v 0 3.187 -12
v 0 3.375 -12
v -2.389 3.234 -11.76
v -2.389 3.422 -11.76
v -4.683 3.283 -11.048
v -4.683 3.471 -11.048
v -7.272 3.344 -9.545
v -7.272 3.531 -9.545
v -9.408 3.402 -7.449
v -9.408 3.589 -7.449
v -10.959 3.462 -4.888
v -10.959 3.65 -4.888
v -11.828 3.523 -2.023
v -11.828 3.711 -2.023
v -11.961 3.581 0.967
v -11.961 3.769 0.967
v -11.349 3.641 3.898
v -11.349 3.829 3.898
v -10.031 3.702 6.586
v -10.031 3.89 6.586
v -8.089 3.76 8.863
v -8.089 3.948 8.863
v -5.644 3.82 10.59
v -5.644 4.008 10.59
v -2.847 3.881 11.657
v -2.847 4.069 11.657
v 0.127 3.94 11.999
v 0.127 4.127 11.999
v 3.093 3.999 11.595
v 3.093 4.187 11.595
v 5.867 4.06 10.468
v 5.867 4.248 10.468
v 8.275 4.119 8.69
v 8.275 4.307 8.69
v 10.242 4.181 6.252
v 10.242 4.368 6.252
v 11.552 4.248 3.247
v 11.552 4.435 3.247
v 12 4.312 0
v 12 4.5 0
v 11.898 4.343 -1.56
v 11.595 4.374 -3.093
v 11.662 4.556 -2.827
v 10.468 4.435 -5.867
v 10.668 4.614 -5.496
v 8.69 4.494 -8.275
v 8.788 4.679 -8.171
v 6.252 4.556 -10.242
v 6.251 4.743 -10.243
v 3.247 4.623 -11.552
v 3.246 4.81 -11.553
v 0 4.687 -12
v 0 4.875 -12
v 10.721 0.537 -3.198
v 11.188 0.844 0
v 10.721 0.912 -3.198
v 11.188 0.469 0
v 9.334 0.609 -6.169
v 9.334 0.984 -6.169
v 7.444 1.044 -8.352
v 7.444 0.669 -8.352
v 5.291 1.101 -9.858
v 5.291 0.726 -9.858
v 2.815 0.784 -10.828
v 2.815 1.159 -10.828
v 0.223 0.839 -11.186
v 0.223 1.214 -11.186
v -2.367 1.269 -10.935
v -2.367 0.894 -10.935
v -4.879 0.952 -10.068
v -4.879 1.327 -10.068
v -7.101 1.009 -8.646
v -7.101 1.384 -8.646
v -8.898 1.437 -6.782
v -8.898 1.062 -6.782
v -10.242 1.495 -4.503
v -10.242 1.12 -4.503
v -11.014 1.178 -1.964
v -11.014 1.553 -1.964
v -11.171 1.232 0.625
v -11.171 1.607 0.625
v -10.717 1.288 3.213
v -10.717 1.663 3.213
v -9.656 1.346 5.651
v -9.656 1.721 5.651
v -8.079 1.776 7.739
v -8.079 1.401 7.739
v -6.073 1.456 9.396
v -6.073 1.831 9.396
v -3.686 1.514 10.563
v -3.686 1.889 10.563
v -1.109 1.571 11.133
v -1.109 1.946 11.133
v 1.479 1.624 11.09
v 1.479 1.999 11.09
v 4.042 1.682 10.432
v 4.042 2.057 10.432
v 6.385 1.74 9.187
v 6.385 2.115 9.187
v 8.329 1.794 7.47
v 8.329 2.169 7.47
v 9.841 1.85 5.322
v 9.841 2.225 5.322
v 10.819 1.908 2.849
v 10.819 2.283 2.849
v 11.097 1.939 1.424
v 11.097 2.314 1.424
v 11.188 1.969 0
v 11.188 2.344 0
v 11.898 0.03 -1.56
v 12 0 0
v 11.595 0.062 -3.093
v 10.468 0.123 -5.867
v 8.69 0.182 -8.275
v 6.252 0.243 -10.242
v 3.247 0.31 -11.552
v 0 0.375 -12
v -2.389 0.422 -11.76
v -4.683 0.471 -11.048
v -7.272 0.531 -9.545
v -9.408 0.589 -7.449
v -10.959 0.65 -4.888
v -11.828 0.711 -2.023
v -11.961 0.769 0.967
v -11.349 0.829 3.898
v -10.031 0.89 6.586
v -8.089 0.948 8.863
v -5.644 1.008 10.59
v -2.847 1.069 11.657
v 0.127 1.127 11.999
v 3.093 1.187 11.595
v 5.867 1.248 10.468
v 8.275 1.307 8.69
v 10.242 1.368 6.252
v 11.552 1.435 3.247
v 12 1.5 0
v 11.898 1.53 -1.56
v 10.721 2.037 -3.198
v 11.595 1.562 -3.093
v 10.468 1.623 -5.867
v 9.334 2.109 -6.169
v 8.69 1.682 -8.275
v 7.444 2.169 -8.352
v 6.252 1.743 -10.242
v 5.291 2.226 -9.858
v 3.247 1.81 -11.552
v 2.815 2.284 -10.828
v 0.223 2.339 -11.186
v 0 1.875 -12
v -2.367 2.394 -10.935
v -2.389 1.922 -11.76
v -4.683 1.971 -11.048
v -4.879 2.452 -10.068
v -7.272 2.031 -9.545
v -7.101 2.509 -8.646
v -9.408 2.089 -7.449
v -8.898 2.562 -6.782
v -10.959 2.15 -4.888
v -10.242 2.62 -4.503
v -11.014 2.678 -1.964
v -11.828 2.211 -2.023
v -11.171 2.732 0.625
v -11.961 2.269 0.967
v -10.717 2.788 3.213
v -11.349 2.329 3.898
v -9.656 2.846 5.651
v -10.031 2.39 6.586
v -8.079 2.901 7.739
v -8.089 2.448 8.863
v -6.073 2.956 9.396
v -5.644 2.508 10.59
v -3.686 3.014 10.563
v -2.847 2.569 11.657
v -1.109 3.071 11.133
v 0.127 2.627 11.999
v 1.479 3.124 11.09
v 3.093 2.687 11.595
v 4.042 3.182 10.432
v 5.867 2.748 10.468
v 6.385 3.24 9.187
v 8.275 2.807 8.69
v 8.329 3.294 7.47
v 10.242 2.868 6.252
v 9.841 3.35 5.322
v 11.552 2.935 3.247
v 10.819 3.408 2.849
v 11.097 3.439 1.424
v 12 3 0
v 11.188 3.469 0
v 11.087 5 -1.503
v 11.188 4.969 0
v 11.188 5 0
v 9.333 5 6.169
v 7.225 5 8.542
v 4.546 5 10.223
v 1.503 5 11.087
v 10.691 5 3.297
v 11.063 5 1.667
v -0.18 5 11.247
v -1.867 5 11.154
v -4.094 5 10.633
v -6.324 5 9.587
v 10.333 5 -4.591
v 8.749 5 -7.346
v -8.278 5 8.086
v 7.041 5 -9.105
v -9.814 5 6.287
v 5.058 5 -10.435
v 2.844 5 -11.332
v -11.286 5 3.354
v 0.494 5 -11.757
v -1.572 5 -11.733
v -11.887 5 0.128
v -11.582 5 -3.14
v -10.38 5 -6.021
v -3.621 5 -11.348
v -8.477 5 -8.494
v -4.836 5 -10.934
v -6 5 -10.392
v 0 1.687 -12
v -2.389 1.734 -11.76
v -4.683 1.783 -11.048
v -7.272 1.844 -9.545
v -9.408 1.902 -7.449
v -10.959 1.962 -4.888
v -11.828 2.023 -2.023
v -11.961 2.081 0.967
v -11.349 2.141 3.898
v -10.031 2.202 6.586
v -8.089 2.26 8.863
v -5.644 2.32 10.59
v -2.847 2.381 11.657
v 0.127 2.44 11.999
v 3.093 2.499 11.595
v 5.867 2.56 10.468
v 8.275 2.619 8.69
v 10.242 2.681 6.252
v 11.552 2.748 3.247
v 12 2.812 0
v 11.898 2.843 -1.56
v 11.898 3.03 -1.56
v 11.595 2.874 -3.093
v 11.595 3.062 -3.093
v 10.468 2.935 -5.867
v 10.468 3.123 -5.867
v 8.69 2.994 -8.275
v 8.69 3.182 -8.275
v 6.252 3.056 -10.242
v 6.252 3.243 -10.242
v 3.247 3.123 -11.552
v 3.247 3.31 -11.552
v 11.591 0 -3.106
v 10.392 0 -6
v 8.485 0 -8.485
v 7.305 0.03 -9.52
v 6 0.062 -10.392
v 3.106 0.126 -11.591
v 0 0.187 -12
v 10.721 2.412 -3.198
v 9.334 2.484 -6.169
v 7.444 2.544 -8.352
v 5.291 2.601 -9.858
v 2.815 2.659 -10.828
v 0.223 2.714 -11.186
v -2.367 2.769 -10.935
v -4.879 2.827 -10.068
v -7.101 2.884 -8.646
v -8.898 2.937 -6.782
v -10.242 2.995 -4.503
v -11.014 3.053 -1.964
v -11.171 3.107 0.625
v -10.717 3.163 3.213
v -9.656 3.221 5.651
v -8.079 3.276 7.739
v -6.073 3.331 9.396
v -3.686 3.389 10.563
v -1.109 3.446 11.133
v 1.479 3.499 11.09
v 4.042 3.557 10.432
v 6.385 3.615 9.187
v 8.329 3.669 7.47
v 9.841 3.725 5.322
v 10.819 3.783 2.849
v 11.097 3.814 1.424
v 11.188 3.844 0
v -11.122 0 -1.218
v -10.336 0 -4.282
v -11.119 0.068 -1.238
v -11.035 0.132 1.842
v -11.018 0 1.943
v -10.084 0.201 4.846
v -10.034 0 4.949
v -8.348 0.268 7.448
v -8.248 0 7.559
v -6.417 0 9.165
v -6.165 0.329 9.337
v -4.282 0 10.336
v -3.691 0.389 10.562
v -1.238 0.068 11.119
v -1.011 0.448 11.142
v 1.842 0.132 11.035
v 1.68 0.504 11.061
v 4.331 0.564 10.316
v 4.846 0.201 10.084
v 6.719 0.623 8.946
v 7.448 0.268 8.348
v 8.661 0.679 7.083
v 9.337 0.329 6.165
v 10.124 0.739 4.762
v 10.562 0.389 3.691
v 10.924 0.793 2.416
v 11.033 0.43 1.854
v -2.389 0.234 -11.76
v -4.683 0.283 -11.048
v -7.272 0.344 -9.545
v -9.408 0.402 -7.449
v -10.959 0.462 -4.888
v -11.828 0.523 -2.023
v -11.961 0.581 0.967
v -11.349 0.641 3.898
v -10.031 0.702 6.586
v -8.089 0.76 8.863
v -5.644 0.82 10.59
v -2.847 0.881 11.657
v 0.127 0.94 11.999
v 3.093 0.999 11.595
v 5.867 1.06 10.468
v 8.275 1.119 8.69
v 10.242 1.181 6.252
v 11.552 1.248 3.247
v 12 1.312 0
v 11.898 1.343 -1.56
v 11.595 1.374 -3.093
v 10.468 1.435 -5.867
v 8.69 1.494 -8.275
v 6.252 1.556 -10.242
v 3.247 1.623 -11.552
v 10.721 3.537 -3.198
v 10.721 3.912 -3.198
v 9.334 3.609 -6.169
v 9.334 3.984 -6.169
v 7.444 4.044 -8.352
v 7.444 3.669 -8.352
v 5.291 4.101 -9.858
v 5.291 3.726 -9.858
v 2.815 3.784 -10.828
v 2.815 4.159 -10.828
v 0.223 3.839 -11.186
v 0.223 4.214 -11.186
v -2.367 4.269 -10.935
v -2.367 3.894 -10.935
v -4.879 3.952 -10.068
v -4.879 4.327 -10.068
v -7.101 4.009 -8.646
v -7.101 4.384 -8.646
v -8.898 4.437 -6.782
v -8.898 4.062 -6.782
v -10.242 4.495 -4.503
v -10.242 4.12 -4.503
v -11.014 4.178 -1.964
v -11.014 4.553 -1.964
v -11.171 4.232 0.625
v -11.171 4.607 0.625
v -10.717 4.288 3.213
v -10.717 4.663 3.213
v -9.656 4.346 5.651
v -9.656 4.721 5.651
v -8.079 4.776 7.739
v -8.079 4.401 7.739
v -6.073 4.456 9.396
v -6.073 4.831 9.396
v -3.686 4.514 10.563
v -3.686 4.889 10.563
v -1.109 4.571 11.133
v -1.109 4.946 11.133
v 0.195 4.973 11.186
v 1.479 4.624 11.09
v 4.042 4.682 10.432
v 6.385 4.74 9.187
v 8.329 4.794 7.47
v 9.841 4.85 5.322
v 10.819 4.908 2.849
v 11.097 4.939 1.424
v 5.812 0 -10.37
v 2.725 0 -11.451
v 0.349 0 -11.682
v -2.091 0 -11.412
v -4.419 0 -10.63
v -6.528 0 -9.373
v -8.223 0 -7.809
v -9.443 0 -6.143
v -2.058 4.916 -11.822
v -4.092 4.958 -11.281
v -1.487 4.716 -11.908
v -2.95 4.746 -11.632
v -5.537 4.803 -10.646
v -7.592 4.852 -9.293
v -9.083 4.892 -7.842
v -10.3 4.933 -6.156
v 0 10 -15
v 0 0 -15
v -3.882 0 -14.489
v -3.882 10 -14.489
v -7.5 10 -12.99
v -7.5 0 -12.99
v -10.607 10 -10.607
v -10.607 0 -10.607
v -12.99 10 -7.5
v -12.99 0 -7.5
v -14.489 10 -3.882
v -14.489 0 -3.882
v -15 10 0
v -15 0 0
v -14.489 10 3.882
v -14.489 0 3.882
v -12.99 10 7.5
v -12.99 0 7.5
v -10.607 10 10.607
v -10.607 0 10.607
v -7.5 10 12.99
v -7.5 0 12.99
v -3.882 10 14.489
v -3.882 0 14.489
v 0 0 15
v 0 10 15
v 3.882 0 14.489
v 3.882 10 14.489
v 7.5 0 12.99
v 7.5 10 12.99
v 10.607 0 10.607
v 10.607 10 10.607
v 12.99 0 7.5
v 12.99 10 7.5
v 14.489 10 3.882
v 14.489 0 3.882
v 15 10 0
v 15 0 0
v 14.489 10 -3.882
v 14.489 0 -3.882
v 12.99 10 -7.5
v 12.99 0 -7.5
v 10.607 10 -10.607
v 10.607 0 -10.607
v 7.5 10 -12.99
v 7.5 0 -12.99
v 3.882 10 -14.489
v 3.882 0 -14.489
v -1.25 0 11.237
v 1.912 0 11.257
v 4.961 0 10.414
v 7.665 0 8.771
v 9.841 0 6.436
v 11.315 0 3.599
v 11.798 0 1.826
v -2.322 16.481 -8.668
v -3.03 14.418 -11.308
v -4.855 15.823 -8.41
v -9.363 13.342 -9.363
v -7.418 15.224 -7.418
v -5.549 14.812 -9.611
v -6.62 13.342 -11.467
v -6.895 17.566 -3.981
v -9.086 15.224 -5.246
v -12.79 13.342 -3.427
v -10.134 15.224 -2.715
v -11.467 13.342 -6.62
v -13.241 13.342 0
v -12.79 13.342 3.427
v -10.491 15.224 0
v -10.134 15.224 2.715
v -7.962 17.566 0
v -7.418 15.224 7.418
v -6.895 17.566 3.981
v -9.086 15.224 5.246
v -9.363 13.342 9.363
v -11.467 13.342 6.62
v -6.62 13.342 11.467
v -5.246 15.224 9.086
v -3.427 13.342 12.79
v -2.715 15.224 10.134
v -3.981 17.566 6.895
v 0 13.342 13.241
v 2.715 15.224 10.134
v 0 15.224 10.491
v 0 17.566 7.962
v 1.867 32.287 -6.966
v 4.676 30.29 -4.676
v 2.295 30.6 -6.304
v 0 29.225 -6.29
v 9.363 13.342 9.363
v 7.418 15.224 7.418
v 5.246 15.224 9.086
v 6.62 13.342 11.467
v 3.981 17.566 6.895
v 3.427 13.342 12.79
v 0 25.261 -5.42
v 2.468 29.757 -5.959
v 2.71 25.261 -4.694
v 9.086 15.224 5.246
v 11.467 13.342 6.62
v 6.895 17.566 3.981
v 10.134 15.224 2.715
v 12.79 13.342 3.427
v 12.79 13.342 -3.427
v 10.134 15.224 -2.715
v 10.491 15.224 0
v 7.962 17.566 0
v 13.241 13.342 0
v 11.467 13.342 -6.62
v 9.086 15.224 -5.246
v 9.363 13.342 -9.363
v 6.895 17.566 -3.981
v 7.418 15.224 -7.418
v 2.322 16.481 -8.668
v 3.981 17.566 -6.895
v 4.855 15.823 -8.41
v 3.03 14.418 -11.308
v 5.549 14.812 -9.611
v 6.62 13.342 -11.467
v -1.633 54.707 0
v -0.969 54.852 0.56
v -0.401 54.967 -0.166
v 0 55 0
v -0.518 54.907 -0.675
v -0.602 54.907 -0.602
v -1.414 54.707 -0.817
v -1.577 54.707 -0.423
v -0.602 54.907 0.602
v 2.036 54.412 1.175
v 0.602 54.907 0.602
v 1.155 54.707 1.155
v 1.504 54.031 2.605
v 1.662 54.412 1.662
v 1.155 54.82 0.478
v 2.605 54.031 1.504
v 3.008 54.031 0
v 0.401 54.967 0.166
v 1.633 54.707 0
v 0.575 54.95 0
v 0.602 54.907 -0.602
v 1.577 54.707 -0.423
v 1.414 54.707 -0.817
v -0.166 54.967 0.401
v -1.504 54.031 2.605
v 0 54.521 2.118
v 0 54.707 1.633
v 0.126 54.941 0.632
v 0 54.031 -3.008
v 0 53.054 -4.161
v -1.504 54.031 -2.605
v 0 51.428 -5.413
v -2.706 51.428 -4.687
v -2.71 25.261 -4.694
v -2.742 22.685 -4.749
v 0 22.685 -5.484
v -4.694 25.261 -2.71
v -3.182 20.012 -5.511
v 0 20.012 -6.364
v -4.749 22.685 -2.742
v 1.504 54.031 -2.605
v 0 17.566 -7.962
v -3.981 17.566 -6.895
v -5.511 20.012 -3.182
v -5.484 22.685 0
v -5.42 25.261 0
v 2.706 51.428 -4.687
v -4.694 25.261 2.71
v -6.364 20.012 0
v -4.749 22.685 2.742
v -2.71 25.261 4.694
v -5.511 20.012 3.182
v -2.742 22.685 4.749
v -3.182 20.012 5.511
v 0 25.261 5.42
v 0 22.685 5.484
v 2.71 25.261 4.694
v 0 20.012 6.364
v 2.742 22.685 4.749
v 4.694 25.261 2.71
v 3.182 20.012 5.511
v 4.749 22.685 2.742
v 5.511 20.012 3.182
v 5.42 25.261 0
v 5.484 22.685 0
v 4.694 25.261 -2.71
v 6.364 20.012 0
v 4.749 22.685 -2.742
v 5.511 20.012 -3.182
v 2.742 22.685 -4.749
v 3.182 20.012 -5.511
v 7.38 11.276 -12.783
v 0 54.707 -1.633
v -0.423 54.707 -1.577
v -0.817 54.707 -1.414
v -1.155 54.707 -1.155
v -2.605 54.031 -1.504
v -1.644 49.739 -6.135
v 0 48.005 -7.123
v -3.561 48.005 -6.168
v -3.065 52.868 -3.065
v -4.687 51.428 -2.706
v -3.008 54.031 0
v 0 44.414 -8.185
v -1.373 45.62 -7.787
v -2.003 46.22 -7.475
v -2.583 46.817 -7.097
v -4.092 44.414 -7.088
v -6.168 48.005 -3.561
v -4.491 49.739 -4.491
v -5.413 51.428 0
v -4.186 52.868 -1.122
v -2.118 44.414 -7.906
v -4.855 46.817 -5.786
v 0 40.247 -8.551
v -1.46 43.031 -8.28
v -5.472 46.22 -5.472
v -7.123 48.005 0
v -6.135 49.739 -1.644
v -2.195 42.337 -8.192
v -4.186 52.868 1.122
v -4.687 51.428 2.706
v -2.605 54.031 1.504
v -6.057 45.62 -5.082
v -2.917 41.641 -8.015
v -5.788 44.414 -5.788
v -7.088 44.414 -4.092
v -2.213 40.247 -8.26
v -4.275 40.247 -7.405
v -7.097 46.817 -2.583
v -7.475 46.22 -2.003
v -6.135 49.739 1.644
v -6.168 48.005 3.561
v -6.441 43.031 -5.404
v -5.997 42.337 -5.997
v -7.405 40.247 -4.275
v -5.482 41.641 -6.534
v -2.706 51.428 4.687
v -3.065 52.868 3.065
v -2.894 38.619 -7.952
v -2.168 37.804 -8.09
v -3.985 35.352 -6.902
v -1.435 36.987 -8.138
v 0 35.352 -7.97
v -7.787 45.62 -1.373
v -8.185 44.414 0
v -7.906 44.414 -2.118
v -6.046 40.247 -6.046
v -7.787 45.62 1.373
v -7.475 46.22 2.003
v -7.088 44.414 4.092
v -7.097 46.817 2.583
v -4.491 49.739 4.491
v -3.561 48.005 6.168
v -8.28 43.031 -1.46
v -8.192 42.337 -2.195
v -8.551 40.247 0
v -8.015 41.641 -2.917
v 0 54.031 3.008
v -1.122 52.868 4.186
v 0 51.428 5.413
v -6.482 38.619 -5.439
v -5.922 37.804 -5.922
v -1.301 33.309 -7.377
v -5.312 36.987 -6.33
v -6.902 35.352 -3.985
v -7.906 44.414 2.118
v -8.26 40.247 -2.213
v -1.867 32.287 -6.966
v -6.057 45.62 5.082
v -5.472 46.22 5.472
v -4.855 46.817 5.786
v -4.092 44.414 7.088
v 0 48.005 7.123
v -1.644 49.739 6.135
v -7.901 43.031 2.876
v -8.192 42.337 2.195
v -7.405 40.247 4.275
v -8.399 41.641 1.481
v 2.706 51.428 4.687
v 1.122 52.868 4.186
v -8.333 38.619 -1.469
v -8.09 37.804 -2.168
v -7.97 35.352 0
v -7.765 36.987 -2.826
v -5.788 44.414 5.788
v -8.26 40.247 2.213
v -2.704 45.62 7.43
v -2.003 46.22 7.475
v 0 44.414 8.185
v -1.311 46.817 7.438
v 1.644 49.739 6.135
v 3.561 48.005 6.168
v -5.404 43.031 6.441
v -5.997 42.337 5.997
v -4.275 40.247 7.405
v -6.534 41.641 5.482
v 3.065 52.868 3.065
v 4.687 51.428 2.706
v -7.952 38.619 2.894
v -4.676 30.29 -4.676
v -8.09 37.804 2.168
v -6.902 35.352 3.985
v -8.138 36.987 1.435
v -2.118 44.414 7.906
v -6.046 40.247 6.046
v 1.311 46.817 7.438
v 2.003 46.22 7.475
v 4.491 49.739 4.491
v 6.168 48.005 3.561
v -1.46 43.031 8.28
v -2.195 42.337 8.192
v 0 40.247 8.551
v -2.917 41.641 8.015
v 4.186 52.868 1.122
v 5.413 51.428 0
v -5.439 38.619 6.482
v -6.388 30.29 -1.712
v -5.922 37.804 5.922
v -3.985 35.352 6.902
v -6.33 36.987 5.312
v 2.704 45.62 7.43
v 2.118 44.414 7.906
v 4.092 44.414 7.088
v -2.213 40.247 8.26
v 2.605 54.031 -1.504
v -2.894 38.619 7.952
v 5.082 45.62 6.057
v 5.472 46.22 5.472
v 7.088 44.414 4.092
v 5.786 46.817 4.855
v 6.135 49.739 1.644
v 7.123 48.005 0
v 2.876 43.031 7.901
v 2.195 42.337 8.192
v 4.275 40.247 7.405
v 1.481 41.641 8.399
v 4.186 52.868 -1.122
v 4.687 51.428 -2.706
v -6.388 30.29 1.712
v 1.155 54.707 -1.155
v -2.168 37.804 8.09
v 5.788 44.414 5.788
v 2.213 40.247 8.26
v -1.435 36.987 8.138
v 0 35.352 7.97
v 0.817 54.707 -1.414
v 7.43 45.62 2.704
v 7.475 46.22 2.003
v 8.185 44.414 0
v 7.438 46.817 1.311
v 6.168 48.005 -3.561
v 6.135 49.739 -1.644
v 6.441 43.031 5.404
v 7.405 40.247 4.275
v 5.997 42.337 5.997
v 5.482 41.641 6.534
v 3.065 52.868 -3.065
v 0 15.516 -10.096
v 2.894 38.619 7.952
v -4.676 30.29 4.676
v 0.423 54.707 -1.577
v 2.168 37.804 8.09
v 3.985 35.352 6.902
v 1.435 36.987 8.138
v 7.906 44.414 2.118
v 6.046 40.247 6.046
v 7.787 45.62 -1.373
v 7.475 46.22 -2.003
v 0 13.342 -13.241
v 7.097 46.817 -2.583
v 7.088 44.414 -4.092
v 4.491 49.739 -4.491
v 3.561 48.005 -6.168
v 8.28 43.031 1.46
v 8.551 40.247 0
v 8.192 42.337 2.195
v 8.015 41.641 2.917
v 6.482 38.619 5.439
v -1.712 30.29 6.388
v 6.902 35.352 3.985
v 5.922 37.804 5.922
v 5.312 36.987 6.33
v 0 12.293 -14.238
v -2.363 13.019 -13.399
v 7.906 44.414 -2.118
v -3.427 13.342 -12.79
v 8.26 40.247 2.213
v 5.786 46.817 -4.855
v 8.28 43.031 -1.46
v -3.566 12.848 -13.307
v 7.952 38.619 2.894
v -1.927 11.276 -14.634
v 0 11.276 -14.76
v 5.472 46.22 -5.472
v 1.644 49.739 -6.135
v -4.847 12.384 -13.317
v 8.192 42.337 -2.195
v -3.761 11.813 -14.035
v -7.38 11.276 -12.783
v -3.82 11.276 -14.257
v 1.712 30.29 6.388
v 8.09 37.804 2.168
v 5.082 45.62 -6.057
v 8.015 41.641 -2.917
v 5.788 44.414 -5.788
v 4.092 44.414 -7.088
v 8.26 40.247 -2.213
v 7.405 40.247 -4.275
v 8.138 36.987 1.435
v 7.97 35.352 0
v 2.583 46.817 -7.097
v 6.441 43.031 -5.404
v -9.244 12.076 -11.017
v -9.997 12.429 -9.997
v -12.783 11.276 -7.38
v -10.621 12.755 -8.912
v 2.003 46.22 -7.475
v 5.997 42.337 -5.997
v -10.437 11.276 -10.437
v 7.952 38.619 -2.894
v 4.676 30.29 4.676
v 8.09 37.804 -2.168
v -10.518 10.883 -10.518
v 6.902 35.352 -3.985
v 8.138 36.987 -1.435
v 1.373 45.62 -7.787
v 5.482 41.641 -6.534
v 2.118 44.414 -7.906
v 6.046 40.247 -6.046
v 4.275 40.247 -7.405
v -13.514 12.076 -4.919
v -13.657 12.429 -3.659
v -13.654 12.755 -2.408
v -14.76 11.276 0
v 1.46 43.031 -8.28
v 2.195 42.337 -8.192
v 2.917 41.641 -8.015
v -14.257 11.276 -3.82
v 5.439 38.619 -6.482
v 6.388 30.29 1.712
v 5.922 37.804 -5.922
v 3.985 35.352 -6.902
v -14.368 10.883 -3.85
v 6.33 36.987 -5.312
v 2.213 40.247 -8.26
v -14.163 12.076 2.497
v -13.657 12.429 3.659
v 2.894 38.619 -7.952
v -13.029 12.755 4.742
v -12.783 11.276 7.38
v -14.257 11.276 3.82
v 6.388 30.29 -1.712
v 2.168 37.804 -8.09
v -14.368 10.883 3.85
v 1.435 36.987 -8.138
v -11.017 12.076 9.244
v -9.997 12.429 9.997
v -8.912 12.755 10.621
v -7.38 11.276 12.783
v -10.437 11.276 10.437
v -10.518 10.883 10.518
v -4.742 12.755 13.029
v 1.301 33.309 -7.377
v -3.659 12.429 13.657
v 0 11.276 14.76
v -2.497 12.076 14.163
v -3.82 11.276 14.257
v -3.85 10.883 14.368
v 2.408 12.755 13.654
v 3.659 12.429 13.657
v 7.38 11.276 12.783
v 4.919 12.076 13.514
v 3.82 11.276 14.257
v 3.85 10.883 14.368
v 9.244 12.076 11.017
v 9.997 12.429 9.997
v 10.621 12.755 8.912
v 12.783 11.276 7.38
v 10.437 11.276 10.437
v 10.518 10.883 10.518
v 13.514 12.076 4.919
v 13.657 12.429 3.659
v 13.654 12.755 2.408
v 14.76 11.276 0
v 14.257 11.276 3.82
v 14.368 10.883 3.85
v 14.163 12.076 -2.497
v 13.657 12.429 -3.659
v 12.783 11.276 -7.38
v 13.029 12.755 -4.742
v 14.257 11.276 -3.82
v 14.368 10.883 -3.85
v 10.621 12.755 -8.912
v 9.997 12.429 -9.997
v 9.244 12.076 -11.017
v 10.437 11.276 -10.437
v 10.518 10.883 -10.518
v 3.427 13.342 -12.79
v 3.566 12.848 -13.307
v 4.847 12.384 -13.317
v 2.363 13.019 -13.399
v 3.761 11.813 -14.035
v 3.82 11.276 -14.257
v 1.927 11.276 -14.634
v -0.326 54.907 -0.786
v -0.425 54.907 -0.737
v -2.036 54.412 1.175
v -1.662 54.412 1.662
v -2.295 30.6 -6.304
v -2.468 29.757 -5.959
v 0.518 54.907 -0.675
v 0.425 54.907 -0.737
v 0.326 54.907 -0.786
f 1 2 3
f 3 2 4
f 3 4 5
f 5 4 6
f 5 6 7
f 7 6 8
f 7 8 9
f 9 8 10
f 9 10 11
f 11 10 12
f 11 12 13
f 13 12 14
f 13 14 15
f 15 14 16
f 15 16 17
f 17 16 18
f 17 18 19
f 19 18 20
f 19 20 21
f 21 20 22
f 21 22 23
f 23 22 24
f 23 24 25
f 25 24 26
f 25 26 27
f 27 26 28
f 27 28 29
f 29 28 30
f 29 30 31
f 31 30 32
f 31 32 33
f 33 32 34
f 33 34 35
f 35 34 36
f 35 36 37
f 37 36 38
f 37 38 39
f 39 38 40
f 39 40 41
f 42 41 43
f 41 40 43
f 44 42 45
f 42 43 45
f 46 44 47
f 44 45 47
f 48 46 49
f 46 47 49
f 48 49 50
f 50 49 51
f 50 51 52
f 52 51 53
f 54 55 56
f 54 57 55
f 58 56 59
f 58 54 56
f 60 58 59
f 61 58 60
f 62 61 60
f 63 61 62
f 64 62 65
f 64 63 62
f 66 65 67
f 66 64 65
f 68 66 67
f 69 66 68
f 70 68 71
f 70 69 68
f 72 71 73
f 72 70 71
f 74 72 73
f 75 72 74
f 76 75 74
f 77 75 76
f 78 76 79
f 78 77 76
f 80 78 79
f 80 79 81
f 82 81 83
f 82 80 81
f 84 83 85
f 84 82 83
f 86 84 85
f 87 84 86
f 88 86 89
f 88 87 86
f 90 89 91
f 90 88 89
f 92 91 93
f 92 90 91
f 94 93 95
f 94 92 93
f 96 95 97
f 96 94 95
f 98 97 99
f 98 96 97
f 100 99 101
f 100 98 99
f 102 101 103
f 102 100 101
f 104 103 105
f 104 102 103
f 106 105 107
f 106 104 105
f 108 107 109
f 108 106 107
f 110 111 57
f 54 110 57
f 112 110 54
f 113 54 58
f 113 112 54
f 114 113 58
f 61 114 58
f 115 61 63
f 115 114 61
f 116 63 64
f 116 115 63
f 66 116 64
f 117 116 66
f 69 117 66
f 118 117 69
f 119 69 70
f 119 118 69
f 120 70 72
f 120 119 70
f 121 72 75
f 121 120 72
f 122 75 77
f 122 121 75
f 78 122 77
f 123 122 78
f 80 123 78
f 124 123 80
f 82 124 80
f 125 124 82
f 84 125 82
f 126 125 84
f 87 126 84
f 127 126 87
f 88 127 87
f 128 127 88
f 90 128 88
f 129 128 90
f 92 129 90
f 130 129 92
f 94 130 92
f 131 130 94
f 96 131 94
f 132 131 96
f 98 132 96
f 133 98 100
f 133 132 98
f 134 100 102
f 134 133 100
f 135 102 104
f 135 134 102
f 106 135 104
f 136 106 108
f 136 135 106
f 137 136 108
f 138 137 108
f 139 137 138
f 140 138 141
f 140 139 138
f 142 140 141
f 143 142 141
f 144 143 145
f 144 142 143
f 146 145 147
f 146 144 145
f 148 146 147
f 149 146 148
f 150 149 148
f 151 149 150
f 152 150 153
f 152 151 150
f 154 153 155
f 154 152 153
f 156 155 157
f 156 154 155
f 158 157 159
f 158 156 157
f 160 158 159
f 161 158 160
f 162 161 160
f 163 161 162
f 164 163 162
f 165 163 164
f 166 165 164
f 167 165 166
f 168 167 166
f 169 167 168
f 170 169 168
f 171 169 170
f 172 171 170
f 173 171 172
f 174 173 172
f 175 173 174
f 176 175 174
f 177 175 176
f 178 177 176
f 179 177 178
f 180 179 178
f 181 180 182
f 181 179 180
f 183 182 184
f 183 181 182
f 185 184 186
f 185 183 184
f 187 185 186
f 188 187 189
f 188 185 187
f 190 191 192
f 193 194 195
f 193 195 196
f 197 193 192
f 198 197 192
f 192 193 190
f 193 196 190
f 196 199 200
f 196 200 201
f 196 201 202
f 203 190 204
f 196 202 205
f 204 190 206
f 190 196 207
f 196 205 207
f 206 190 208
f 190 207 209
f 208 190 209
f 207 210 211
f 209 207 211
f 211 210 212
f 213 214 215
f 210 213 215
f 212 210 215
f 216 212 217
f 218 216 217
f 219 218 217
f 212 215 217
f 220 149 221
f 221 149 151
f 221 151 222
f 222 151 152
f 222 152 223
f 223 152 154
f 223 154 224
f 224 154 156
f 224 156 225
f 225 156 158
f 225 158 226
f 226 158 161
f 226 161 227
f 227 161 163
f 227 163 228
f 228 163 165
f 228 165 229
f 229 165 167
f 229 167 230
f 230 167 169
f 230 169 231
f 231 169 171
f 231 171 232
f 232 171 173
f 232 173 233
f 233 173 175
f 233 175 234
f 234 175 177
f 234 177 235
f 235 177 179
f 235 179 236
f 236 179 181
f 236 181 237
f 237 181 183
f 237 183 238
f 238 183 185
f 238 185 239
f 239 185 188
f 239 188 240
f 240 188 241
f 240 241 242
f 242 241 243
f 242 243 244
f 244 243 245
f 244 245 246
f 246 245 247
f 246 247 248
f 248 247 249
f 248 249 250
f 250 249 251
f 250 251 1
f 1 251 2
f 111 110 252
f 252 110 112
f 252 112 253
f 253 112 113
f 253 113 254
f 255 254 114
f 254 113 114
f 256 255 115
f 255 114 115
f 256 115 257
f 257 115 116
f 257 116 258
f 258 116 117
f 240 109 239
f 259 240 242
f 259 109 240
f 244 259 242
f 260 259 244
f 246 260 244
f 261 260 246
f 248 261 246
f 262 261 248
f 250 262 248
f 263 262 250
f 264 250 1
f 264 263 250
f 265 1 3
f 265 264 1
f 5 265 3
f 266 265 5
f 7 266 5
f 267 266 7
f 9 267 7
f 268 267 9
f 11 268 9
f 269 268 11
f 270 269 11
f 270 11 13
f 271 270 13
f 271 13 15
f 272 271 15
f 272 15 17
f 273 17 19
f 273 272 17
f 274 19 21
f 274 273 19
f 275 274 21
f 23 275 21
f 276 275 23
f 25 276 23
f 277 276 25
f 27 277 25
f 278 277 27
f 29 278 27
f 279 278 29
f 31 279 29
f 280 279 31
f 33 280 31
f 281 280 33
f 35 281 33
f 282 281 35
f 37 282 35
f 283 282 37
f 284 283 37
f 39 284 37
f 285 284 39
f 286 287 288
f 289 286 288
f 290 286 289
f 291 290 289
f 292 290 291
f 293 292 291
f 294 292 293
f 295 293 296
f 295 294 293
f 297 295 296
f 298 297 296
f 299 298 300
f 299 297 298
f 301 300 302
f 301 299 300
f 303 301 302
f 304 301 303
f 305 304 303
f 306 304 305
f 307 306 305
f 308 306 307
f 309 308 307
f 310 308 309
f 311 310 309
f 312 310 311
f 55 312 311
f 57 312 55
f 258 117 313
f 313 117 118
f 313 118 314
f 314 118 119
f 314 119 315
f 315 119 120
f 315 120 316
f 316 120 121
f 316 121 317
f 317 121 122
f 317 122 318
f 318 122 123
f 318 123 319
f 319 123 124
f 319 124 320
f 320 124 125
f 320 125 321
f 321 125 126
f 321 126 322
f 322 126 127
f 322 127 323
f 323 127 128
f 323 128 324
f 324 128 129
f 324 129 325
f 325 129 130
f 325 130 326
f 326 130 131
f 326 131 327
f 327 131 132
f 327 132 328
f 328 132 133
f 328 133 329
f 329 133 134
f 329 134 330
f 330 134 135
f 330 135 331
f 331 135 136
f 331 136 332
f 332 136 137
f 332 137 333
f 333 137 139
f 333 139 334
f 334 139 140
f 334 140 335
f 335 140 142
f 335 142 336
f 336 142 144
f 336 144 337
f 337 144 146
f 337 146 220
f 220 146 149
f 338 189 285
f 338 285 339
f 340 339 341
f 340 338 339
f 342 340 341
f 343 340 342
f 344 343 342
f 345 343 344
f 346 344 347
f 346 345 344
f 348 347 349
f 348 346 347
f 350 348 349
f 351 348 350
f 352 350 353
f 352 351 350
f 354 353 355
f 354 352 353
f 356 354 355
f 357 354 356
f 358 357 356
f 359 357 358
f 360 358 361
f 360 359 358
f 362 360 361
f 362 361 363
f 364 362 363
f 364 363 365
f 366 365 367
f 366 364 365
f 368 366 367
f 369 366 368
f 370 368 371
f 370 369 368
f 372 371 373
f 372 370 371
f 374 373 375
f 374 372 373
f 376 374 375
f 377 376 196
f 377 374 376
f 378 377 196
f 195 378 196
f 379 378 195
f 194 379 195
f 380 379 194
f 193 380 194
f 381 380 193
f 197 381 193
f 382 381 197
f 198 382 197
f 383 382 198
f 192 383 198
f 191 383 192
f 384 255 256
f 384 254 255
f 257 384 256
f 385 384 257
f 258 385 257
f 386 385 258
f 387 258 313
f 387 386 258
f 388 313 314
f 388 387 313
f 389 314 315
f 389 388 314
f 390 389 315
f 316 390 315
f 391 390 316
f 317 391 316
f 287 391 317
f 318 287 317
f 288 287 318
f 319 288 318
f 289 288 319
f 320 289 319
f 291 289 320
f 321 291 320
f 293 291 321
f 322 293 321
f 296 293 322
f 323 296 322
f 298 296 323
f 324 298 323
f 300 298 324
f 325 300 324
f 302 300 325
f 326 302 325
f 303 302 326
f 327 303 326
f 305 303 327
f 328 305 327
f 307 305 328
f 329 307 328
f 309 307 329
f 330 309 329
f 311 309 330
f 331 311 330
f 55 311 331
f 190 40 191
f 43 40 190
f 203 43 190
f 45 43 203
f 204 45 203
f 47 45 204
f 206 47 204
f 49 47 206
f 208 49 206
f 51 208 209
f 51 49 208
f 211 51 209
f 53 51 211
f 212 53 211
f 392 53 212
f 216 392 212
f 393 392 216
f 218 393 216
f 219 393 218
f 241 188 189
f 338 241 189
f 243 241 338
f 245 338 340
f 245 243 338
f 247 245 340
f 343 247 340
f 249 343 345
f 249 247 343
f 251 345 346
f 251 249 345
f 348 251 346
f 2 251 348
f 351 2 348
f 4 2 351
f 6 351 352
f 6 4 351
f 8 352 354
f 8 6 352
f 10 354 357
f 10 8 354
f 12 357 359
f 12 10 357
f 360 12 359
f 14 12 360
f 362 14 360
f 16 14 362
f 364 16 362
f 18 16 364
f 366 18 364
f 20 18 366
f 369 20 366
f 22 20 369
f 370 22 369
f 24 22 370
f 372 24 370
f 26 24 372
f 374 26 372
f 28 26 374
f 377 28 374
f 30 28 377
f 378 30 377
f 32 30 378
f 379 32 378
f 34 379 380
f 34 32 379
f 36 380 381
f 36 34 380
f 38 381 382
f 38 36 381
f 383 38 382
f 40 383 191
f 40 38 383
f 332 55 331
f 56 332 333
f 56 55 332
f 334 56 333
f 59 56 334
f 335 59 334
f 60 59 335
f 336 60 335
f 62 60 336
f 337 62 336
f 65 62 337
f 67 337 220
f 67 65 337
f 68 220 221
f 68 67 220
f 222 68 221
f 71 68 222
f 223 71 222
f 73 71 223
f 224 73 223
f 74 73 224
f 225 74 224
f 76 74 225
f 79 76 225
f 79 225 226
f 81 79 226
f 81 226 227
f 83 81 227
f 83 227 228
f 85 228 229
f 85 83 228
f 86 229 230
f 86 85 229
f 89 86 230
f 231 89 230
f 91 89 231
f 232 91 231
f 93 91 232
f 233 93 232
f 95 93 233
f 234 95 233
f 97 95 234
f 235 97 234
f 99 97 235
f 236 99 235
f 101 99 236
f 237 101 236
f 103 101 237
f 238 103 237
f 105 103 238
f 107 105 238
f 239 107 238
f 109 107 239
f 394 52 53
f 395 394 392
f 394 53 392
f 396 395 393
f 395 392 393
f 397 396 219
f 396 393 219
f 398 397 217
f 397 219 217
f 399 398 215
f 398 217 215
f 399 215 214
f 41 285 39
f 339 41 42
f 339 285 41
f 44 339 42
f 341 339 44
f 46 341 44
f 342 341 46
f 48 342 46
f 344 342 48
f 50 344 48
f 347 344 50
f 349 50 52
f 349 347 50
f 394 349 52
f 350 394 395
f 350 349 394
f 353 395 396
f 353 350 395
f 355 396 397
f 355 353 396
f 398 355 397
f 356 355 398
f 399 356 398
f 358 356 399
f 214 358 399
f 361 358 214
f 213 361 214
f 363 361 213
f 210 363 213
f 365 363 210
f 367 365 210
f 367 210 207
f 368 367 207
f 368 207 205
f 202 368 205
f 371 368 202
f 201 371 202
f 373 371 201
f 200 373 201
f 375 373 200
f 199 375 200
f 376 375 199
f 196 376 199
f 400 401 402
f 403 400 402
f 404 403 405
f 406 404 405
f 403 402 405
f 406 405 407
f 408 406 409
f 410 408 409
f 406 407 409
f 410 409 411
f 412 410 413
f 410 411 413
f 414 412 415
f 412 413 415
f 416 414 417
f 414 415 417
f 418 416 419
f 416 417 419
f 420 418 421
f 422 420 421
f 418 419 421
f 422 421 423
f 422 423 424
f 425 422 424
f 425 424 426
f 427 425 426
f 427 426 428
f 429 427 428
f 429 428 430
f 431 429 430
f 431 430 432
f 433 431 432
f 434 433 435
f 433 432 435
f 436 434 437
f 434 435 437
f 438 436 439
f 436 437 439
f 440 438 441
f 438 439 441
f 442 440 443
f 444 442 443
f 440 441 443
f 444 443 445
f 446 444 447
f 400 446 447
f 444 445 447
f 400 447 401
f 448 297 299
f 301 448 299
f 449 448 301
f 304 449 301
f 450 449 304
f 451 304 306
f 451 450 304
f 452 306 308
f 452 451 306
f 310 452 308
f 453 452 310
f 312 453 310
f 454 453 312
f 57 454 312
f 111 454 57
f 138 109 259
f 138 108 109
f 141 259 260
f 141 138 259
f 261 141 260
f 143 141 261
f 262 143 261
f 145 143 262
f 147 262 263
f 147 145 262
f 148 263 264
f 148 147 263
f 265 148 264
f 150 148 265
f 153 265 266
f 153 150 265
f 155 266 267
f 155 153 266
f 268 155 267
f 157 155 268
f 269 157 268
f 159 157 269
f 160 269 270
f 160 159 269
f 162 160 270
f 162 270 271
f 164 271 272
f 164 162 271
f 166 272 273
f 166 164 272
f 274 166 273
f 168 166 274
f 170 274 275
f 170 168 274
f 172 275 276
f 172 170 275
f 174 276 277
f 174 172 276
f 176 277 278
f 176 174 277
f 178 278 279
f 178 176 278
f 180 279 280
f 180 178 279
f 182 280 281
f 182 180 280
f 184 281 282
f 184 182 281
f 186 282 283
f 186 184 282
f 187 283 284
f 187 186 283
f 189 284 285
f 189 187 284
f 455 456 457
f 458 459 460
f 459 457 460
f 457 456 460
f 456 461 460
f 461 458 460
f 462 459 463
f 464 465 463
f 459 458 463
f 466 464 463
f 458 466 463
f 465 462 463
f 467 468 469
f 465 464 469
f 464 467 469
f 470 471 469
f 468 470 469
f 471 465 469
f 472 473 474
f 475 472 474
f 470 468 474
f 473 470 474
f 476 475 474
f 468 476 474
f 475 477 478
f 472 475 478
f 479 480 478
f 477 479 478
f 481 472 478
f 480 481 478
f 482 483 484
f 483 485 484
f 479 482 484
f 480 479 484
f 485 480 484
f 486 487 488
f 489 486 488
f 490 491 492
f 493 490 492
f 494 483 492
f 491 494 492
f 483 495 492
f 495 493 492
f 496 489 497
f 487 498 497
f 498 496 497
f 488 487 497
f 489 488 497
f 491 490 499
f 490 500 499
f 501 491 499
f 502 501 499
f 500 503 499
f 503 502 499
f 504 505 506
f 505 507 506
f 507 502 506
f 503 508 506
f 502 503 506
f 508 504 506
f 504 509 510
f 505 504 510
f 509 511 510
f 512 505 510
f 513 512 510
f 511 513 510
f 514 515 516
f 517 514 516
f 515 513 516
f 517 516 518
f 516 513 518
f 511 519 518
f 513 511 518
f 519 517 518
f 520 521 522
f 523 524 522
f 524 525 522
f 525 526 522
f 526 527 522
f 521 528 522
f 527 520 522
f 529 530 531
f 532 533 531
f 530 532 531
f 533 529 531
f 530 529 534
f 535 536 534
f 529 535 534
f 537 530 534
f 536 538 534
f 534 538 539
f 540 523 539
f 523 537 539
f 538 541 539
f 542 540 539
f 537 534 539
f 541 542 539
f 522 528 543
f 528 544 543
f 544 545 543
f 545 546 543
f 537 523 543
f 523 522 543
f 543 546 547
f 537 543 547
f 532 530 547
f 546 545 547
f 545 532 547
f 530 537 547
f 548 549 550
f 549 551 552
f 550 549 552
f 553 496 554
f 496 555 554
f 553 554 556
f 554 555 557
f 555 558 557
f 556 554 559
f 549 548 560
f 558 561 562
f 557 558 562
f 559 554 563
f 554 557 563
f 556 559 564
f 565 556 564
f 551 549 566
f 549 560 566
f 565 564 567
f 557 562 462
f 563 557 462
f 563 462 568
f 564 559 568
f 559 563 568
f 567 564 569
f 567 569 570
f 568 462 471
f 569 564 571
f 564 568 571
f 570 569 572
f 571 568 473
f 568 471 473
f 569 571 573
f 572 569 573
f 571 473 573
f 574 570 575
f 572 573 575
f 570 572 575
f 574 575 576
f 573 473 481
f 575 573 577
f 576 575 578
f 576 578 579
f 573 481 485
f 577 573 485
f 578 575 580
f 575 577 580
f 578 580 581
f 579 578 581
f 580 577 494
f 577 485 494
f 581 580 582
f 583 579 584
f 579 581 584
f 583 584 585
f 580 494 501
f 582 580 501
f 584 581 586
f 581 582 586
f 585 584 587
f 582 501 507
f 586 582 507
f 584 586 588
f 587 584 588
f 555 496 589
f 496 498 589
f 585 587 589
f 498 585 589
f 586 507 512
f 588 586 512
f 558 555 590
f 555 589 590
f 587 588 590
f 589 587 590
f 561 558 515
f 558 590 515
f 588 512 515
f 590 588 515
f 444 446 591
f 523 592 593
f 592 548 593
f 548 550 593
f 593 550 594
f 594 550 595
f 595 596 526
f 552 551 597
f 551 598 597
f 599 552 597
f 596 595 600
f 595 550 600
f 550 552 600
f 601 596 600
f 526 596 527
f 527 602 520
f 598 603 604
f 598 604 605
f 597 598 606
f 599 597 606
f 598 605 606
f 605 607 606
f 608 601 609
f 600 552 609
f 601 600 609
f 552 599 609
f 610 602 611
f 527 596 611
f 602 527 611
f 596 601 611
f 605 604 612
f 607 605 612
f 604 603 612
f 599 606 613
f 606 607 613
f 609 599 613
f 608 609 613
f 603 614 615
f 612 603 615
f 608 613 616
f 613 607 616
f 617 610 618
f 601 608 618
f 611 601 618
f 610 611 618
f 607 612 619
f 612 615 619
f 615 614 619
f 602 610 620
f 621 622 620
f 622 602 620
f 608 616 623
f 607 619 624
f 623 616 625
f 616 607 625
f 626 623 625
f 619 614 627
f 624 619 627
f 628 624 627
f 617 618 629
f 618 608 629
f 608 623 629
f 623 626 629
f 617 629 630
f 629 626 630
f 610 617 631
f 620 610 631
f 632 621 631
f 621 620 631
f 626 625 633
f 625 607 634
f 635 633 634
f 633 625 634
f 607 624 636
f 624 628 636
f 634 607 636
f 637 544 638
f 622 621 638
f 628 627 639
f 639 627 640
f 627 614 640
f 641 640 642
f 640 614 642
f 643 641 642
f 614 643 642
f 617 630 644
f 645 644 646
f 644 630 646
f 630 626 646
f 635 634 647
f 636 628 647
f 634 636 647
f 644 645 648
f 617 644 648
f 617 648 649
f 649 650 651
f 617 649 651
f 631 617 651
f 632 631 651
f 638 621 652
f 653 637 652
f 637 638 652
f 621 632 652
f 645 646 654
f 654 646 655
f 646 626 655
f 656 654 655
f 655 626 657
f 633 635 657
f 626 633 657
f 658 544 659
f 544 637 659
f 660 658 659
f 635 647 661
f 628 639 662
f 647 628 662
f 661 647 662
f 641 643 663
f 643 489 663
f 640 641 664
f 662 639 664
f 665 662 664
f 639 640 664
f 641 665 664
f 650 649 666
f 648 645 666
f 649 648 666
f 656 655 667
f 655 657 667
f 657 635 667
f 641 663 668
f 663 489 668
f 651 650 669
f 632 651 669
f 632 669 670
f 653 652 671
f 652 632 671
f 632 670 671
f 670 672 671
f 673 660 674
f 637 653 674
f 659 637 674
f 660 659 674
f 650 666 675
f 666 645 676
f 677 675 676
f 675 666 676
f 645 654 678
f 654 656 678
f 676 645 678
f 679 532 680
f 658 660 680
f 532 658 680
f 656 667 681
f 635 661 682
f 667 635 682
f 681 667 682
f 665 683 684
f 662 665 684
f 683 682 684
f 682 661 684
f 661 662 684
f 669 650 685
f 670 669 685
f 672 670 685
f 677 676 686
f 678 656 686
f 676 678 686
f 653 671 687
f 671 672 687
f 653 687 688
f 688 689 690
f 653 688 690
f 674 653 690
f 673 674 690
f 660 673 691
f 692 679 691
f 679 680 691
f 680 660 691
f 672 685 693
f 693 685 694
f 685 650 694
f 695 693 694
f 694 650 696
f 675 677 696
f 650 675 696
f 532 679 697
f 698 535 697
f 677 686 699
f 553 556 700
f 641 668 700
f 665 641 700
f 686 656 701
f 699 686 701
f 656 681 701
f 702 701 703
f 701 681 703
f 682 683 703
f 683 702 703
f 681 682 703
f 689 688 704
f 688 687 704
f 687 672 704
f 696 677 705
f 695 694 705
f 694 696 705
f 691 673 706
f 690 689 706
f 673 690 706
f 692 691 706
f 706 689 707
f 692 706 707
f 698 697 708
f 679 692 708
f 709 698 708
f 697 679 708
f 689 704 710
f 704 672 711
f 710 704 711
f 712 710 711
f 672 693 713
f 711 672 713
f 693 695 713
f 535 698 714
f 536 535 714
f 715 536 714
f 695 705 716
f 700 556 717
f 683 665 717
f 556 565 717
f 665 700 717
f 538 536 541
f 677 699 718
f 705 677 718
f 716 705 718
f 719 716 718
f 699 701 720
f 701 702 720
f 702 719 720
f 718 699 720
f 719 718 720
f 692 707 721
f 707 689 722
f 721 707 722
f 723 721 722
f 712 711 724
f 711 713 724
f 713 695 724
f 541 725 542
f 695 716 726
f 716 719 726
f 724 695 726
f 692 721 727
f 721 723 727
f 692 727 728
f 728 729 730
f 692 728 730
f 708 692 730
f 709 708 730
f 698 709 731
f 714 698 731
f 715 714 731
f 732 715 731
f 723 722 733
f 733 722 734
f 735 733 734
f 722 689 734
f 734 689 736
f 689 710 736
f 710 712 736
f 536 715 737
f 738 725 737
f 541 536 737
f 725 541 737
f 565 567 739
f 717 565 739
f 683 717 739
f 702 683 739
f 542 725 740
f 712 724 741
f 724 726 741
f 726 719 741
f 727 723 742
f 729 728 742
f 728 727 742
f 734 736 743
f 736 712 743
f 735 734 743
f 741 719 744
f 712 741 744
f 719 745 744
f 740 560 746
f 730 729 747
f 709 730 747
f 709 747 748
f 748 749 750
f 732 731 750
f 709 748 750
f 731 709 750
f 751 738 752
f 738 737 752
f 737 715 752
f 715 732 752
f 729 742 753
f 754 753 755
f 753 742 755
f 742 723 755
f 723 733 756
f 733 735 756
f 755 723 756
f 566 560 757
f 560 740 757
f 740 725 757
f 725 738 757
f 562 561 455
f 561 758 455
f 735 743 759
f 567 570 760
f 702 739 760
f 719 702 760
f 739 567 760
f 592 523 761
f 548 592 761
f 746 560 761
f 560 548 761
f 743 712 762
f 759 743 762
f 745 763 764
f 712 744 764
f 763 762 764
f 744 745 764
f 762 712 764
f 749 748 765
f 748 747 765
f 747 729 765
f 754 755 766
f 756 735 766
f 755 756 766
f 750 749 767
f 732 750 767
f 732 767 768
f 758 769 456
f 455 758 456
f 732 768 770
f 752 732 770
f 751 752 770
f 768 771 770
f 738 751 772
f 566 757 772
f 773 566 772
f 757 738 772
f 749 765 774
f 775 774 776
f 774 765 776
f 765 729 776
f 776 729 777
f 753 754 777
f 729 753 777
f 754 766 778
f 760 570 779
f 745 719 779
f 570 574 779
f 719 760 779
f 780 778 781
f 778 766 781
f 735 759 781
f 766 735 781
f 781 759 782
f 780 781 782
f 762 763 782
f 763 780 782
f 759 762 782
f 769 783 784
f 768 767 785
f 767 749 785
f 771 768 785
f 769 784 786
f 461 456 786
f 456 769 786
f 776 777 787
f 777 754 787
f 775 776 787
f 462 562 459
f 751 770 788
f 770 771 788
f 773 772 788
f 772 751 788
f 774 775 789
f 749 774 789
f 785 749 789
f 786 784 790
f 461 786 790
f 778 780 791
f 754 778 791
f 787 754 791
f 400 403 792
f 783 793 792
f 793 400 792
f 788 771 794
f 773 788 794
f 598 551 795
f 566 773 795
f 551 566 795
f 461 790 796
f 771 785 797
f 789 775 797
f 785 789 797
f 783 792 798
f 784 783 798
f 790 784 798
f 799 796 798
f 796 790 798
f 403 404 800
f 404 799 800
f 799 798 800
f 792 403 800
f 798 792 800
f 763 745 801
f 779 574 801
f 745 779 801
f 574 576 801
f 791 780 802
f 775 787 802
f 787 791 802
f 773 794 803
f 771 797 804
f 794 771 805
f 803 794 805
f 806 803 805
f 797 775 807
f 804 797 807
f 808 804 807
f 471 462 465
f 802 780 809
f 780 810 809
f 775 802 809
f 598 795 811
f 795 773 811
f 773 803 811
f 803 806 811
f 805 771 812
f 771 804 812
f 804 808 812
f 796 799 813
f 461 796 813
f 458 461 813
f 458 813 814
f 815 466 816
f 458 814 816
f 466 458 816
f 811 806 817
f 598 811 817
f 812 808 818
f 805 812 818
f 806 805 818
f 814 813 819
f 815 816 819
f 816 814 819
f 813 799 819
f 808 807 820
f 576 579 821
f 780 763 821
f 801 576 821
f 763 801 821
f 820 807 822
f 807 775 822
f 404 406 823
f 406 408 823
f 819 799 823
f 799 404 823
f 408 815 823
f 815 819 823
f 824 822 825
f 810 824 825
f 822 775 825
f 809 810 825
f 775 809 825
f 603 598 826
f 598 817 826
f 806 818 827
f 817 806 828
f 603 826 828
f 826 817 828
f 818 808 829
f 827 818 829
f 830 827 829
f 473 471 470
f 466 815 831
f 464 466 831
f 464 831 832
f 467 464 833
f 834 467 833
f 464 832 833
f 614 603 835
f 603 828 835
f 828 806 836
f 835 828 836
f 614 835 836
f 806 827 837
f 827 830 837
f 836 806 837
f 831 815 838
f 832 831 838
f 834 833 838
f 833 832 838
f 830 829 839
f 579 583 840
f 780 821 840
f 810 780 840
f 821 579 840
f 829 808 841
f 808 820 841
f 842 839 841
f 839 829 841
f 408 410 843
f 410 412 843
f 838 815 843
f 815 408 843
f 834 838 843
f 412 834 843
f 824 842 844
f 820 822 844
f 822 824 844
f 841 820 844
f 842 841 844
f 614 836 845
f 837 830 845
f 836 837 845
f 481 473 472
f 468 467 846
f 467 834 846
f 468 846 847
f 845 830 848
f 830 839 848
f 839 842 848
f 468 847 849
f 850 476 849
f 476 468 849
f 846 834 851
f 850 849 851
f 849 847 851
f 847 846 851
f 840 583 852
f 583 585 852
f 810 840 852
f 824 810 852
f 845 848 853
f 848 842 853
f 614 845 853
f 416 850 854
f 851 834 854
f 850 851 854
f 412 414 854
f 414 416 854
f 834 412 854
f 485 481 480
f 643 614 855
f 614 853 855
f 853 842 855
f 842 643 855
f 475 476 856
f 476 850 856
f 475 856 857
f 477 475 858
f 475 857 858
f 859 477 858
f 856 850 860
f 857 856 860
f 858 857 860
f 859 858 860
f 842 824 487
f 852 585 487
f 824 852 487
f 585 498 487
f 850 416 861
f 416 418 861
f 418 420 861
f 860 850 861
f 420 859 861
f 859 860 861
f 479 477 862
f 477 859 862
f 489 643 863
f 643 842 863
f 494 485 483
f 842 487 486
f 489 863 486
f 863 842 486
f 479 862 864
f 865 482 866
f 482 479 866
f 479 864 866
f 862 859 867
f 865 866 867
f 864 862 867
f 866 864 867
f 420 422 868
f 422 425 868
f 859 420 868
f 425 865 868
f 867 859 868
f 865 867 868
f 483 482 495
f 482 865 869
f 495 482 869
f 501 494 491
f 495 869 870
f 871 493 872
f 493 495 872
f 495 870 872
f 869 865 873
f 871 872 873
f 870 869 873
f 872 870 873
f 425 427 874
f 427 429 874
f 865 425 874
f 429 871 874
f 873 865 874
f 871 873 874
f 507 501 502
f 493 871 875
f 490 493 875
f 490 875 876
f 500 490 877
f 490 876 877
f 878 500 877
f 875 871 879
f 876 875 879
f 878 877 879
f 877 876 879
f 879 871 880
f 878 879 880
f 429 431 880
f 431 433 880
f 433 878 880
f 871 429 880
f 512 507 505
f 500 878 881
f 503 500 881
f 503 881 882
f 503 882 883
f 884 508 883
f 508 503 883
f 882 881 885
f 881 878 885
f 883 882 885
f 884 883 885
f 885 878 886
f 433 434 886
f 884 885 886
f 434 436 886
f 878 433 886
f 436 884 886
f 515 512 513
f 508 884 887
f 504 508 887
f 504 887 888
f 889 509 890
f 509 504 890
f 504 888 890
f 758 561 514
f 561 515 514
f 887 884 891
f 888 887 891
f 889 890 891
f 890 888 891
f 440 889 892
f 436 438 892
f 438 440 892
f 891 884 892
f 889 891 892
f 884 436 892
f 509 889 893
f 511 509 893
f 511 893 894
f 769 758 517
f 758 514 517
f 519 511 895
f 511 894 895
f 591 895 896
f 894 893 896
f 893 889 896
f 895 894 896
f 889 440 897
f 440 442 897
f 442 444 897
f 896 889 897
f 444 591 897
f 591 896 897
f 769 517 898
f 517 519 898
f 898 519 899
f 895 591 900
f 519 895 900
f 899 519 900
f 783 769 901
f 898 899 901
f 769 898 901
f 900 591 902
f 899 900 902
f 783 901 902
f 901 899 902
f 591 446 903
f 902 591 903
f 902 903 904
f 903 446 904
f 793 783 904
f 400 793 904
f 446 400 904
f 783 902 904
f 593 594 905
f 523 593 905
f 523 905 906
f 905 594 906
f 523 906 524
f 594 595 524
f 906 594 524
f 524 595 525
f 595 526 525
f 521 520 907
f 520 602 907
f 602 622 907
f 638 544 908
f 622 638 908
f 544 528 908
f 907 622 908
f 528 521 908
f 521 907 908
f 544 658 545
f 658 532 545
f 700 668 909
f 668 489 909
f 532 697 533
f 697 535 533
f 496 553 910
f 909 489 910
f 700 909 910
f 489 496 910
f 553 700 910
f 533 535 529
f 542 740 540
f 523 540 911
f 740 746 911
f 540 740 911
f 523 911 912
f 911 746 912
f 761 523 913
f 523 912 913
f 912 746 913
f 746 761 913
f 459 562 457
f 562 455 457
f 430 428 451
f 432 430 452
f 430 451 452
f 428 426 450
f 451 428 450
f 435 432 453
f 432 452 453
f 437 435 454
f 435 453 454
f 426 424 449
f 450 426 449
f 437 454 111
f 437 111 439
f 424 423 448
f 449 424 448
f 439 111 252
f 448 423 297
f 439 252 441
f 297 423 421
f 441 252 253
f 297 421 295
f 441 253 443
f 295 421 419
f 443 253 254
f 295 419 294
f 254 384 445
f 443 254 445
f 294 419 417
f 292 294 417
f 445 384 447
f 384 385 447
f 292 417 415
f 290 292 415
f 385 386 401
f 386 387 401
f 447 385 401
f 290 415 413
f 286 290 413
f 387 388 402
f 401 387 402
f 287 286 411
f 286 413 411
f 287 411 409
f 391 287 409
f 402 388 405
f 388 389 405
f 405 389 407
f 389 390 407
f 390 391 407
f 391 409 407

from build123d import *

# Parameters (mm, degrees)
ROSCA1_PITCH          = 1.5
CORTAR_EXTRUIR1_START = 10
CROQUIS3_R            = 15
CORTAR_EXTRUIR1_DEPTH = 10


with BuildPart() as part:
    # Croquis1 → Revolución1 (revolve)
    with BuildSketch(Plane.XY, mode=Mode.PRIVATE) as revoluci_n1_sk:
        with BuildLine():
            Line((-12, 0), (-12, 5))
            Line((-12, 5), (0, 5))
            Line((0, 5), (0, 55))
            add(Edge.make_bspline(
                [(0, 55), (-3.180764289, 54.869157284), (-6.802128833, 49.987752556), (-9.296892214, 41.327039564), (-7.460278375, 32.164910722), (-3.920844043, 22.793687376), (-9.40714477, 14.872769973), (-14.838813261, 12.976020169), (-15, 10)],
                knots=[0, 0, 0, 0, 0.153337628, 0.314153231, 0.514828567, 0.684692443, 0.859563088, 1, 1, 1, 1], degree=3))
            Line((-15, 10), (-15, 0))
            Line((-15, 0), (-12, 0))
        make_face()
    revolve(revoluci_n1_sk.sketch.rotate(Axis((0, 5, 0), (0, 1, 0)), 270), axis=Axis((0, 5, 0), (0, 1, 0)))

    # Rosca1: the profile of Perfil de rosca1 profile screwed along a right-hand helix of 4.333333 turns, 8 arcs to a turn; built about Z, then put on its axis
    rosca1_z = Axis((0, 0, 0), (0, 0, 1))
    rosca1_corners = [(12.0003, 0, -0.000173205), (12.0003, 0, 1.312673201), (11.188101187, 0, 0.843749998), (11.188101187, 0, 0.468749998)]
    with BuildLine(mode=Mode.PRIVATE) as rosca1_profile:
        Line(rosca1_corners[0], rosca1_corners[1])
        Line(rosca1_corners[1], rosca1_corners[2])
        Line(rosca1_corners[2], rosca1_corners[3])
        Line(rosca1_corners[3], rosca1_corners[0])
    rosca1_cap = Face(rosca1_profile.wire())
    rosca1_turn_angles = [0, 22.5, 45, 67.5, 90, 112.5, 135, 157.5, 180, 202.5, 225, 247.5, 270, 292.5, 315, 337.5, 360]
    rosca1_turn_weights = [1, 0.9238795325112867, 1, 0.9238795325112867, 1, 0.9238795325112867, 1, 0.9238795325112867, 1, 0.9238795325112867, 1, 0.9238795325112867, 1, 0.9238795325112867, 1, 0.9238795325112867, 1]
    rosca1_turn_rails = [Edge.make_bspline([Vector(p[0], p[1], 0).rotate(rosca1_z, rosca1_turn_angles[k]) / rosca1_turn_weights[k] + Vector(0, 0, p[2] + ROSCA1_PITCH * rosca1_turn_angles[k] / 360) for k in range(17)], [0, 0, 0, 1, 1, 2, 2, 3, 3, 4, 4, 5, 5, 6, 6, 7, 7, 8, 8, 8], 2, rosca1_turn_weights) for p in rosca1_corners]
    rosca1_turn_sides = [Face.make_surface_from_curves(rosca1_turn_rails[p[0]], rosca1_turn_rails[p[1]]) for p in [(0, 1), (1, 2), (2, 3), (3, 0)]]
    rosca1_last_angles = [1440, 1462.5, 1485, 1507.5, 1530, 1545, 1560]
    rosca1_last_weights = [1, 0.9238795325112867, 1, 0.9238795325112867, 1, 0.9659258262890683, 1]
    rosca1_last_rails = [Edge.make_bspline([Vector(p[0], p[1], 0).rotate(rosca1_z, rosca1_last_angles[k]) / rosca1_last_weights[k] + Vector(0, 0, p[2] + ROSCA1_PITCH * rosca1_last_angles[k] / 360) for k in range(7)], [0, 0, 0, 1, 1, 2, 2, 3, 3, 3], 2, rosca1_last_weights) for p in rosca1_corners]
    rosca1_last_sides = [Face.make_surface_from_curves(rosca1_last_rails[p[0]], rosca1_last_rails[p[1]]) for p in [(0, 1), (1, 2), (2, 3), (3, 0)]]
    rosca1 = Plane(origin=(0, -1.5, 0), x_dir=(1, 0, 0), z_dir=(0, 1, 0)) * Solid(Shell([*[p.moved(Location((0, 0, ROSCA1_PITCH * i))) for i in range(4) for p in rosca1_turn_sides], *rosca1_last_sides, rosca1_cap, rosca1_cap.rotate(rosca1_z, 1560).moved(Location((0, 0, ROSCA1_PITCH * 1560 / 360)))]))
    add(rosca1)

    # Croquis3 → Cortar-Extruir1 (cut)
    with BuildSketch(Plane.XZ.offset(CORTAR_EXTRUIR1_START)):
        with Locations(Location((0, 0, 0), (0, 0, 270))):
            Circle(CROQUIS3_R)
    extrude(amount=-CORTAR_EXTRUIR1_DEPTH, mode=Mode.SUBTRACT)


solid = part.part
